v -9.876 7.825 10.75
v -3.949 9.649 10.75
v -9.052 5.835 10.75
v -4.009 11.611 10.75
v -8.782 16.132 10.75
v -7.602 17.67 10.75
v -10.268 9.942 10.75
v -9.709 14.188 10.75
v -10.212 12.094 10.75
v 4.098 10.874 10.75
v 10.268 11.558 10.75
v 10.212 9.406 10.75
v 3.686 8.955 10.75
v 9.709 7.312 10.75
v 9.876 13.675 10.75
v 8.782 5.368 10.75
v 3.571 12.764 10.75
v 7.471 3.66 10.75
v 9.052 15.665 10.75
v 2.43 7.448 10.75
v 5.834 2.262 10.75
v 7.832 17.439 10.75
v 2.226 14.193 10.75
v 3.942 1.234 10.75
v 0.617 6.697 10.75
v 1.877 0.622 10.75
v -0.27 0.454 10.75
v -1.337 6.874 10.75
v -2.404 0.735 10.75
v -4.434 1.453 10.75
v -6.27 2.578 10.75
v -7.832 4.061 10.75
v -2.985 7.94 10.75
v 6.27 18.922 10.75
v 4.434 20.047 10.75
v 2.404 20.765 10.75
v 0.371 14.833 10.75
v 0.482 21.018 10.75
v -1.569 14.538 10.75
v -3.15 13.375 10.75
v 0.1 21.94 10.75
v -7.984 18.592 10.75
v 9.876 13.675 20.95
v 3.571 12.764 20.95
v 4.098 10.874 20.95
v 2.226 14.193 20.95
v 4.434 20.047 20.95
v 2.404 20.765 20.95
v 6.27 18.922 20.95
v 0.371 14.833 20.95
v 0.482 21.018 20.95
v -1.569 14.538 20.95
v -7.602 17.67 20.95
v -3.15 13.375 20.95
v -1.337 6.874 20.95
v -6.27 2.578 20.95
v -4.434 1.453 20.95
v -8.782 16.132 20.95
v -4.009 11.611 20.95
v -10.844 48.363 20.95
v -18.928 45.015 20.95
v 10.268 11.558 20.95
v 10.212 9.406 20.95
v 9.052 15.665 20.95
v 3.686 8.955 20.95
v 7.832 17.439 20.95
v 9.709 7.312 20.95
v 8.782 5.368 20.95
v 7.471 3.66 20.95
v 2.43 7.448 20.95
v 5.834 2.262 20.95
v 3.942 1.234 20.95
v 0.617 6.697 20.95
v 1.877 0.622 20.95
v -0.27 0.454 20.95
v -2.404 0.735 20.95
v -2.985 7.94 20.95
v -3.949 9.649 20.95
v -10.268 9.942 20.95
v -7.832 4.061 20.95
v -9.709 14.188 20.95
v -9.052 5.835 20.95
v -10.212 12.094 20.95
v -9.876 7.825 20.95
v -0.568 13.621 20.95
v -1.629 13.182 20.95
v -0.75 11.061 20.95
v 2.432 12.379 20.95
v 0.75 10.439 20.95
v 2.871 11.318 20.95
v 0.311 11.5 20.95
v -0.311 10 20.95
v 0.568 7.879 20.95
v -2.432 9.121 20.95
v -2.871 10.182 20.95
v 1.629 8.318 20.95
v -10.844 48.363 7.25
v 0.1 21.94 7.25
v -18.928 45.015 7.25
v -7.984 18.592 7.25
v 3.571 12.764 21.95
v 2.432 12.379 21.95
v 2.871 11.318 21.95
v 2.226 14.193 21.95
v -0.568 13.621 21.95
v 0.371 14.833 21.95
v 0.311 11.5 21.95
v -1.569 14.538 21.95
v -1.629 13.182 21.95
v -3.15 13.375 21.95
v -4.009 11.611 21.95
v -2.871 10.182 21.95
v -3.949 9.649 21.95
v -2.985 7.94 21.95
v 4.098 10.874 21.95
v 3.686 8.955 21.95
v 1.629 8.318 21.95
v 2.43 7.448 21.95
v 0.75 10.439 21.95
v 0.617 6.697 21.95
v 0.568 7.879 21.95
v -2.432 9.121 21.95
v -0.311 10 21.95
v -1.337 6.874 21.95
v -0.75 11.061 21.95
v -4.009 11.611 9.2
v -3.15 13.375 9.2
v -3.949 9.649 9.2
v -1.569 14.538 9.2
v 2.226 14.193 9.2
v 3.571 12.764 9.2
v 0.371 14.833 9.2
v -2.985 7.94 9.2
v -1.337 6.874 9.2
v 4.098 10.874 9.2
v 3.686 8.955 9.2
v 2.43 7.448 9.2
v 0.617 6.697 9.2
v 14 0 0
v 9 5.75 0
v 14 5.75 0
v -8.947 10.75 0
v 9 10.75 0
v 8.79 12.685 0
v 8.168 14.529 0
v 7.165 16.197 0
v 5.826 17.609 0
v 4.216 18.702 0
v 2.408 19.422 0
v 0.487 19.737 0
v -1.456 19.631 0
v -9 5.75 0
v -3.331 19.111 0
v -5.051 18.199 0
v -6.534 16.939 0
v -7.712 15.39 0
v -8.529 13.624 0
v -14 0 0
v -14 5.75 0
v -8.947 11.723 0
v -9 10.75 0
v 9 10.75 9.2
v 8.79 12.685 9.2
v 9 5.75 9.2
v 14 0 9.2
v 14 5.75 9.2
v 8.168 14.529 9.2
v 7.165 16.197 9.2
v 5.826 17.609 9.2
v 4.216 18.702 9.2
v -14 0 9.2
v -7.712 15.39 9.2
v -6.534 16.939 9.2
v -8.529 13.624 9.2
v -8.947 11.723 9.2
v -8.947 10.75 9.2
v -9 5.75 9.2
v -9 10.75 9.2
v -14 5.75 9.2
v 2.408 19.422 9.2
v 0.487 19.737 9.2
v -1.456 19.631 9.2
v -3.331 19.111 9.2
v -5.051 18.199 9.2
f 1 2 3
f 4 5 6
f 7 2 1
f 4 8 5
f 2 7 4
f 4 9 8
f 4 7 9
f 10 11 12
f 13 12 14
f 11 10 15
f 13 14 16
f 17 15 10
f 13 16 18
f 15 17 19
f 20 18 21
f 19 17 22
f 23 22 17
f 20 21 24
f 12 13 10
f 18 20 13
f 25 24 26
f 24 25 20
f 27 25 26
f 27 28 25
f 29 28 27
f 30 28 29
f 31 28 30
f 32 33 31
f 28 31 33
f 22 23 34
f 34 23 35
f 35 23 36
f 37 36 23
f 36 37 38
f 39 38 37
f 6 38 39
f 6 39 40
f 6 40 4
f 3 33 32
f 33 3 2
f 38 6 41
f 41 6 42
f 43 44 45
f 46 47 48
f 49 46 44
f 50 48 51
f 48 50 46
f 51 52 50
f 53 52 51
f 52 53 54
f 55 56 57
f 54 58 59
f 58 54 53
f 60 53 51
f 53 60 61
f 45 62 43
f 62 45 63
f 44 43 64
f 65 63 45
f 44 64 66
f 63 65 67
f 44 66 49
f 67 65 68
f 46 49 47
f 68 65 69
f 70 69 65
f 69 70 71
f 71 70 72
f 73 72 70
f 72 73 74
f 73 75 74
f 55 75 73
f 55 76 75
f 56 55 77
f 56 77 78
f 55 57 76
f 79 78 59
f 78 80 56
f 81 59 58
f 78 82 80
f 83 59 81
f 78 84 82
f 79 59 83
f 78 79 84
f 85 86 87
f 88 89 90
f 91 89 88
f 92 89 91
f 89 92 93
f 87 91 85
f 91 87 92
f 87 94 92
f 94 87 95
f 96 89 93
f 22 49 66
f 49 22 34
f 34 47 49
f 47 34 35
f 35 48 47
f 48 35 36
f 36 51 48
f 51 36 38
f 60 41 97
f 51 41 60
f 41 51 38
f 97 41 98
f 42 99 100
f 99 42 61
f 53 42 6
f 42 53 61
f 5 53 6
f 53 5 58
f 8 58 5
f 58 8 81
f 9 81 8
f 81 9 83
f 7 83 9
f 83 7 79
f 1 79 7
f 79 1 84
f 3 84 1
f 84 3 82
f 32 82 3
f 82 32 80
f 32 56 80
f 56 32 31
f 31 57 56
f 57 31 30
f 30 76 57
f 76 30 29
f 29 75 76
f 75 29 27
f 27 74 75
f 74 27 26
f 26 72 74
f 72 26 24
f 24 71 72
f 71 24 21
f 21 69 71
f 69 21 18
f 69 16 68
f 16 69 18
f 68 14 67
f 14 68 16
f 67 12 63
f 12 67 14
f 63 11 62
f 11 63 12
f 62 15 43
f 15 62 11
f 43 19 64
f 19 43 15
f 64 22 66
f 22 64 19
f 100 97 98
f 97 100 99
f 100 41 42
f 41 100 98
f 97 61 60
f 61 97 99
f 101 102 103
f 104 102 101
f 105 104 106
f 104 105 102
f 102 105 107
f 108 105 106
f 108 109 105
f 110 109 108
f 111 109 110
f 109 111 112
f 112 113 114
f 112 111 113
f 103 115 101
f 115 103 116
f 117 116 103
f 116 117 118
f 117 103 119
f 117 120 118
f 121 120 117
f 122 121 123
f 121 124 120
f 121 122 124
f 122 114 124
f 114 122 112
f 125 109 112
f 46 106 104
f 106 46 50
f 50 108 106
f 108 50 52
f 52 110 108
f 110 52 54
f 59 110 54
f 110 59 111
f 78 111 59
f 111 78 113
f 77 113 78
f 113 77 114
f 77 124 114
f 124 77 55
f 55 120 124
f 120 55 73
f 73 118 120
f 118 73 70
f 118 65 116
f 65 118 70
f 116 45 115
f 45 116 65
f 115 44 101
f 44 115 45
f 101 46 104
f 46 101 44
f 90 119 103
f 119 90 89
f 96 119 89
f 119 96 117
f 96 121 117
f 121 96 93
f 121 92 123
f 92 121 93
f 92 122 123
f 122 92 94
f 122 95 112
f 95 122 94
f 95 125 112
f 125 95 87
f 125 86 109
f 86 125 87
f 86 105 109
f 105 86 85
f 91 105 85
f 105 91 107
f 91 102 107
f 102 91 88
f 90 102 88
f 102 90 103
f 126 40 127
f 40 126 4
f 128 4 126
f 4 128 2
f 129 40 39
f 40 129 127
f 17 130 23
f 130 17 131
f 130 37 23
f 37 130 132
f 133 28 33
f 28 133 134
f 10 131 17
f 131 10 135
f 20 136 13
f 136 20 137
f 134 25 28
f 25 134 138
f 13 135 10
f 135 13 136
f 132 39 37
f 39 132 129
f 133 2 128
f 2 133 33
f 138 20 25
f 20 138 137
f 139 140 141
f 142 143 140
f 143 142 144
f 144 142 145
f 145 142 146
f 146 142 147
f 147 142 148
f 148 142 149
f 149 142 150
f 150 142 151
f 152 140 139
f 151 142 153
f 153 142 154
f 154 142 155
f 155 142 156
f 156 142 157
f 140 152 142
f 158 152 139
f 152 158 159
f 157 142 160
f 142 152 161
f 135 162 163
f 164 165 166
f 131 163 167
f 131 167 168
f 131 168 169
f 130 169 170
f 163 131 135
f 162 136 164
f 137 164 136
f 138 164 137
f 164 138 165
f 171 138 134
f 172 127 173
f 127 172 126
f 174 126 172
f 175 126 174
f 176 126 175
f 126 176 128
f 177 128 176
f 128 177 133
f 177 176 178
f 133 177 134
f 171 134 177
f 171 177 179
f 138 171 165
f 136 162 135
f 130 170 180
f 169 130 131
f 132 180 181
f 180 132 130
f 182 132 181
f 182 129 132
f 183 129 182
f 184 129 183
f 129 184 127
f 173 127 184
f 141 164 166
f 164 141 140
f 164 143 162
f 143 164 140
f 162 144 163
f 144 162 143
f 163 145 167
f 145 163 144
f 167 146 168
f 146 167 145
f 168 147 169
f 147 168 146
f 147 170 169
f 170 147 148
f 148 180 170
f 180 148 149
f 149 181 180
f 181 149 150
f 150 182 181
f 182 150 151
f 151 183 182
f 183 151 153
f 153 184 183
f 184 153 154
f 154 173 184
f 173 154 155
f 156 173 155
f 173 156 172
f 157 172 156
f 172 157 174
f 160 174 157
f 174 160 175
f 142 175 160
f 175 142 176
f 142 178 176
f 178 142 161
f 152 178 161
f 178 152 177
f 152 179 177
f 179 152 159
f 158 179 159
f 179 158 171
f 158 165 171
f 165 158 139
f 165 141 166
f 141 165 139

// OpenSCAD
// file: ieq30pro-dimensions.scad
// Units: mm

cast_iron_color = "bisque";//"gray";//"beige";
plastic_color = [0.1,0.1,0.1];
bearing_color = "silver";

////////////////////////////////////////////////////
// Diameter of dec body at bottom, near CW shaft.
dec1_diam = 67.66;
dec1_radius = dec1_diam / 2;

// Length of declination cylinder with dec1_diam.
dec1_len = 131.9;

// The black cap and the bottom of the dec body, where
// the counterweight shaft is attached.
cw_cap_height = 10;
cw_cap_bevel_height = 5;

// There is a countersink in the bottom of the DEC
// body to allow for the counterweight shaft.
cw_cs_diam = 23;
cw_cs_radius = cw_cs_diam / 2;

cw_thread_diam = 16;
cw_thread_radius = cw_thread_diam / 2;

////////////////////////////////////////////////////
// Diameter of the motor end of the DEC body.

dec2_diam = 97.4;  // +/- 0.3mm.
dec2_radius = dec2_diam / 2;
dec2_len = 25.4;

////////////////////////////////////////////////////
// Declination motor cover size.
dec_motor_w = 85.4;  // left-right on face with logo.
dec_motor_h = 68.4;  // up-down on face with logo.
dec_motor_z = 62.4;

// Distance away from bearing plane.
dec_motor_setback = 0.01;

////////////////////////////////////////////////////
// Min dist from face with logo to dec1 cylinder.
dec_motor_z2 = 42;
dec_motor_z_offset =
  dec1_radius + dec_motor_z2 - dec_motor_z;

////////////////////////////////////////////////////
// RA axis diameter at the bearing, where the moving
// and stationary parts meet.
ra1_diam = 120;  // +/- 0.3mm.
ra1_radius = ra1_diam / 2;

////////////////////////////////////////////////////
// Distance from edge of RA bearing to outside of
// DEC body, center of DEC axis, and outside of
// DEC gear cover.
ra1_base_to_dec = 21.5;
ra1_base_to_dec_center = ra1_base_to_dec + dec1_radius;
ra1_base_to_dec_gear_cover =
    ra1_base_to_dec_center - dec2_radius;

////////////////////////////////////////////////////
// Dimensions for the non-moving portion of the
// mount. Much less detail is needed here, so only
// a few objects are modeled.

// RA bearing cover diameter and length.
ra2_radius = ra1_radius;
ra2_len = 24.5;

// RA body becomes narrower.
ra3_radius = ra2_radius - 19.86;
ra3_len = 17.13;

ra_bearing_gap = 0.6;

////////////////////////////////////////////////////
// Dimensions for the DEC and RA clutches. They are
// mostly identical, except that the DEC clutch
// sticks out farther from the DEC head and its
// screw axis is a bit closer to the bearing gap.
// The model won't include the draft angle of the
// handle.

clutch_flange_width = 28;
clutch_flange_height = 5.75;
clutch_extrusion = 9.2; // from casting diam.
clutch_base_diameter = 18;
clutch_base_height = 19.75;
clutch_screw_length = 10.75; // casting to head.
clutch_screw_head_diam = 8.2;
clutch_handle_base_diam = 20.6;
clutch_handle_length = 38.9; // screw center to end.
clutch_handle_width = 8.75; // At widest.
clutch_handle_depth1 = 10.2;
clutch_handle_depth2 = 13.7;

////////////////////////////////////////////////////
// Dimensions for the DEC head (i.e. the part
// rotated by the DEC motor, which has the dove tail
// saddle for holding the telescope).

dec_head_base_diam = 97.66;
dec_head_base_radius = dec_head_base_diam / 2;
dec_head_base_height = 3.83;
dec_head_height = 46.3;  // Above base.
dec_head_diam1 = 89.5;  // At top of base.
dec_head_diam2 = 86.9;  // At top, due to draft angle.
dec_head_scale = dec_head_diam2 / dec_head_diam1;
dec_saddle_depth = 13.8;
dec_saddle_width1 = 43.95; // At top of saddle
dec_saddle_width2 = 46.66; // At bottom of saddle
dovetail_width = 45.25;
dec_slot_corner_radius = 5;
dec_slot_width = 60.4;
dec_slot_len = 25.6;
dec_head_square = 76;
dec_head_clamp_screw_diam = 7.8;  // OD
dec_head_clamp_screw_depth = 6.66;  // Top to centerline.
dec_head_clamp_screw_spacing = 44.4; 

dec_bearing_gap = ra_bearing_gap;

// Maximum distance from DEC head
// out to the tip of the handle (i.e.
// how much you'd have to expand the
// radius of the DEC head to fully
// engulf the handle at its existing
// location.
dec_clutch_handle_max_height = 32;


dec_saddle_height =
    dec_head_base_height +
    dec_head_height - dec_saddle_depth;

/////////////////////////////////////////////
// Computed values for the DEC bearing.

// Can't go too large because otherwise we'll
// hit the RA motor cover.
dec_cover_max_radius =
    dec2_radius + ra1_base_to_dec_gear_cover;
dec_cover_max_diam = dec_cover_max_radius * 2;

// Compute the angle of the circle of the
// DEC gear cover subtended by the motor
// cover. See:
//  https://en.wikipedia.org/wiki/Circular_segment
dec_motor_cover_angle = 2 * asin(dec_motor_w/dec2_diam);

// This needs to be adjusted for each site.
mount_latitude = 42;
// main file
include <ieq30pro-dimensions.scad>

clutch(abs(($t*90)-45)+90*0.75);

module clutch(handle_angle=0) {
  r = clutch_base_diameter/2;
  raise_by = clutch_base_height - r;
  translate([0,raise_by,0]) {
    // Extrusion out of the base
    color(cast_iron_color)
      clutch_base();

    // Handle, shaft and screw.
    translate([0,0,clutch_screw_length])
      rotate([0, 0, handle_angle])
        clutch_handle();
  };
};

module clutch_base() {
  linear_extrude(height=clutch_extrusion)
    union() {
      r = clutch_base_diameter/2;
      circle(r=r);

      w1 = clutch_flange_width;
      h1 = clutch_flange_height;
      w2 = clutch_base_diameter;
      h2 = clutch_base_height - r;

      translate([-w1/2, -h2, 0])
        square([w1,h1]);

      translate([-w2/2, -h2, 0])
        square([w2,h2]);
    };
};

module clutch_handle() {
  color(plastic_color) {
    radius = clutch_handle_base_diam / 2;
    hw = clutch_handle_width / 2;
    linear_extrude(height=clutch_handle_depth1)
      union() {
        circle(r=radius);
        translate([0,-hw])
          square([clutch_handle_length,
                  clutch_handle_width]);
      };

    len2 = clutch_handle_length - radius;
    drop = clutch_handle_depth2-clutch_handle_depth1;
    translate([0,0,-drop])
      linear_extrude(height=clutch_handle_depth2)
        translate([radius,-hw])
          square([len2, clutch_handle_width]);
  };
  
  // The screw head, mostly for decoration.
  color("silver") {
    r = clutch_screw_head_diam/2;
    w = r * 1.4;
    h = w/5;
    translate([0,0,clutch_handle_depth1])
      linear_extrude(height=1)
        difference() {
          circle(r=r);
          square([w,h], center=true);
          square([h,w], center=true);
        }
  };

  // The shaft that is rotated by the handle,
  // of which a little is visible between the
  // handle and the body of the axis.
  color("gold") {
    r = clutch_screw_head_diam/2;
    h = 10;
    translate([0,0, -(h-1)])
      linear_extrude(height=h)
        circle(r=r);
  }
};
